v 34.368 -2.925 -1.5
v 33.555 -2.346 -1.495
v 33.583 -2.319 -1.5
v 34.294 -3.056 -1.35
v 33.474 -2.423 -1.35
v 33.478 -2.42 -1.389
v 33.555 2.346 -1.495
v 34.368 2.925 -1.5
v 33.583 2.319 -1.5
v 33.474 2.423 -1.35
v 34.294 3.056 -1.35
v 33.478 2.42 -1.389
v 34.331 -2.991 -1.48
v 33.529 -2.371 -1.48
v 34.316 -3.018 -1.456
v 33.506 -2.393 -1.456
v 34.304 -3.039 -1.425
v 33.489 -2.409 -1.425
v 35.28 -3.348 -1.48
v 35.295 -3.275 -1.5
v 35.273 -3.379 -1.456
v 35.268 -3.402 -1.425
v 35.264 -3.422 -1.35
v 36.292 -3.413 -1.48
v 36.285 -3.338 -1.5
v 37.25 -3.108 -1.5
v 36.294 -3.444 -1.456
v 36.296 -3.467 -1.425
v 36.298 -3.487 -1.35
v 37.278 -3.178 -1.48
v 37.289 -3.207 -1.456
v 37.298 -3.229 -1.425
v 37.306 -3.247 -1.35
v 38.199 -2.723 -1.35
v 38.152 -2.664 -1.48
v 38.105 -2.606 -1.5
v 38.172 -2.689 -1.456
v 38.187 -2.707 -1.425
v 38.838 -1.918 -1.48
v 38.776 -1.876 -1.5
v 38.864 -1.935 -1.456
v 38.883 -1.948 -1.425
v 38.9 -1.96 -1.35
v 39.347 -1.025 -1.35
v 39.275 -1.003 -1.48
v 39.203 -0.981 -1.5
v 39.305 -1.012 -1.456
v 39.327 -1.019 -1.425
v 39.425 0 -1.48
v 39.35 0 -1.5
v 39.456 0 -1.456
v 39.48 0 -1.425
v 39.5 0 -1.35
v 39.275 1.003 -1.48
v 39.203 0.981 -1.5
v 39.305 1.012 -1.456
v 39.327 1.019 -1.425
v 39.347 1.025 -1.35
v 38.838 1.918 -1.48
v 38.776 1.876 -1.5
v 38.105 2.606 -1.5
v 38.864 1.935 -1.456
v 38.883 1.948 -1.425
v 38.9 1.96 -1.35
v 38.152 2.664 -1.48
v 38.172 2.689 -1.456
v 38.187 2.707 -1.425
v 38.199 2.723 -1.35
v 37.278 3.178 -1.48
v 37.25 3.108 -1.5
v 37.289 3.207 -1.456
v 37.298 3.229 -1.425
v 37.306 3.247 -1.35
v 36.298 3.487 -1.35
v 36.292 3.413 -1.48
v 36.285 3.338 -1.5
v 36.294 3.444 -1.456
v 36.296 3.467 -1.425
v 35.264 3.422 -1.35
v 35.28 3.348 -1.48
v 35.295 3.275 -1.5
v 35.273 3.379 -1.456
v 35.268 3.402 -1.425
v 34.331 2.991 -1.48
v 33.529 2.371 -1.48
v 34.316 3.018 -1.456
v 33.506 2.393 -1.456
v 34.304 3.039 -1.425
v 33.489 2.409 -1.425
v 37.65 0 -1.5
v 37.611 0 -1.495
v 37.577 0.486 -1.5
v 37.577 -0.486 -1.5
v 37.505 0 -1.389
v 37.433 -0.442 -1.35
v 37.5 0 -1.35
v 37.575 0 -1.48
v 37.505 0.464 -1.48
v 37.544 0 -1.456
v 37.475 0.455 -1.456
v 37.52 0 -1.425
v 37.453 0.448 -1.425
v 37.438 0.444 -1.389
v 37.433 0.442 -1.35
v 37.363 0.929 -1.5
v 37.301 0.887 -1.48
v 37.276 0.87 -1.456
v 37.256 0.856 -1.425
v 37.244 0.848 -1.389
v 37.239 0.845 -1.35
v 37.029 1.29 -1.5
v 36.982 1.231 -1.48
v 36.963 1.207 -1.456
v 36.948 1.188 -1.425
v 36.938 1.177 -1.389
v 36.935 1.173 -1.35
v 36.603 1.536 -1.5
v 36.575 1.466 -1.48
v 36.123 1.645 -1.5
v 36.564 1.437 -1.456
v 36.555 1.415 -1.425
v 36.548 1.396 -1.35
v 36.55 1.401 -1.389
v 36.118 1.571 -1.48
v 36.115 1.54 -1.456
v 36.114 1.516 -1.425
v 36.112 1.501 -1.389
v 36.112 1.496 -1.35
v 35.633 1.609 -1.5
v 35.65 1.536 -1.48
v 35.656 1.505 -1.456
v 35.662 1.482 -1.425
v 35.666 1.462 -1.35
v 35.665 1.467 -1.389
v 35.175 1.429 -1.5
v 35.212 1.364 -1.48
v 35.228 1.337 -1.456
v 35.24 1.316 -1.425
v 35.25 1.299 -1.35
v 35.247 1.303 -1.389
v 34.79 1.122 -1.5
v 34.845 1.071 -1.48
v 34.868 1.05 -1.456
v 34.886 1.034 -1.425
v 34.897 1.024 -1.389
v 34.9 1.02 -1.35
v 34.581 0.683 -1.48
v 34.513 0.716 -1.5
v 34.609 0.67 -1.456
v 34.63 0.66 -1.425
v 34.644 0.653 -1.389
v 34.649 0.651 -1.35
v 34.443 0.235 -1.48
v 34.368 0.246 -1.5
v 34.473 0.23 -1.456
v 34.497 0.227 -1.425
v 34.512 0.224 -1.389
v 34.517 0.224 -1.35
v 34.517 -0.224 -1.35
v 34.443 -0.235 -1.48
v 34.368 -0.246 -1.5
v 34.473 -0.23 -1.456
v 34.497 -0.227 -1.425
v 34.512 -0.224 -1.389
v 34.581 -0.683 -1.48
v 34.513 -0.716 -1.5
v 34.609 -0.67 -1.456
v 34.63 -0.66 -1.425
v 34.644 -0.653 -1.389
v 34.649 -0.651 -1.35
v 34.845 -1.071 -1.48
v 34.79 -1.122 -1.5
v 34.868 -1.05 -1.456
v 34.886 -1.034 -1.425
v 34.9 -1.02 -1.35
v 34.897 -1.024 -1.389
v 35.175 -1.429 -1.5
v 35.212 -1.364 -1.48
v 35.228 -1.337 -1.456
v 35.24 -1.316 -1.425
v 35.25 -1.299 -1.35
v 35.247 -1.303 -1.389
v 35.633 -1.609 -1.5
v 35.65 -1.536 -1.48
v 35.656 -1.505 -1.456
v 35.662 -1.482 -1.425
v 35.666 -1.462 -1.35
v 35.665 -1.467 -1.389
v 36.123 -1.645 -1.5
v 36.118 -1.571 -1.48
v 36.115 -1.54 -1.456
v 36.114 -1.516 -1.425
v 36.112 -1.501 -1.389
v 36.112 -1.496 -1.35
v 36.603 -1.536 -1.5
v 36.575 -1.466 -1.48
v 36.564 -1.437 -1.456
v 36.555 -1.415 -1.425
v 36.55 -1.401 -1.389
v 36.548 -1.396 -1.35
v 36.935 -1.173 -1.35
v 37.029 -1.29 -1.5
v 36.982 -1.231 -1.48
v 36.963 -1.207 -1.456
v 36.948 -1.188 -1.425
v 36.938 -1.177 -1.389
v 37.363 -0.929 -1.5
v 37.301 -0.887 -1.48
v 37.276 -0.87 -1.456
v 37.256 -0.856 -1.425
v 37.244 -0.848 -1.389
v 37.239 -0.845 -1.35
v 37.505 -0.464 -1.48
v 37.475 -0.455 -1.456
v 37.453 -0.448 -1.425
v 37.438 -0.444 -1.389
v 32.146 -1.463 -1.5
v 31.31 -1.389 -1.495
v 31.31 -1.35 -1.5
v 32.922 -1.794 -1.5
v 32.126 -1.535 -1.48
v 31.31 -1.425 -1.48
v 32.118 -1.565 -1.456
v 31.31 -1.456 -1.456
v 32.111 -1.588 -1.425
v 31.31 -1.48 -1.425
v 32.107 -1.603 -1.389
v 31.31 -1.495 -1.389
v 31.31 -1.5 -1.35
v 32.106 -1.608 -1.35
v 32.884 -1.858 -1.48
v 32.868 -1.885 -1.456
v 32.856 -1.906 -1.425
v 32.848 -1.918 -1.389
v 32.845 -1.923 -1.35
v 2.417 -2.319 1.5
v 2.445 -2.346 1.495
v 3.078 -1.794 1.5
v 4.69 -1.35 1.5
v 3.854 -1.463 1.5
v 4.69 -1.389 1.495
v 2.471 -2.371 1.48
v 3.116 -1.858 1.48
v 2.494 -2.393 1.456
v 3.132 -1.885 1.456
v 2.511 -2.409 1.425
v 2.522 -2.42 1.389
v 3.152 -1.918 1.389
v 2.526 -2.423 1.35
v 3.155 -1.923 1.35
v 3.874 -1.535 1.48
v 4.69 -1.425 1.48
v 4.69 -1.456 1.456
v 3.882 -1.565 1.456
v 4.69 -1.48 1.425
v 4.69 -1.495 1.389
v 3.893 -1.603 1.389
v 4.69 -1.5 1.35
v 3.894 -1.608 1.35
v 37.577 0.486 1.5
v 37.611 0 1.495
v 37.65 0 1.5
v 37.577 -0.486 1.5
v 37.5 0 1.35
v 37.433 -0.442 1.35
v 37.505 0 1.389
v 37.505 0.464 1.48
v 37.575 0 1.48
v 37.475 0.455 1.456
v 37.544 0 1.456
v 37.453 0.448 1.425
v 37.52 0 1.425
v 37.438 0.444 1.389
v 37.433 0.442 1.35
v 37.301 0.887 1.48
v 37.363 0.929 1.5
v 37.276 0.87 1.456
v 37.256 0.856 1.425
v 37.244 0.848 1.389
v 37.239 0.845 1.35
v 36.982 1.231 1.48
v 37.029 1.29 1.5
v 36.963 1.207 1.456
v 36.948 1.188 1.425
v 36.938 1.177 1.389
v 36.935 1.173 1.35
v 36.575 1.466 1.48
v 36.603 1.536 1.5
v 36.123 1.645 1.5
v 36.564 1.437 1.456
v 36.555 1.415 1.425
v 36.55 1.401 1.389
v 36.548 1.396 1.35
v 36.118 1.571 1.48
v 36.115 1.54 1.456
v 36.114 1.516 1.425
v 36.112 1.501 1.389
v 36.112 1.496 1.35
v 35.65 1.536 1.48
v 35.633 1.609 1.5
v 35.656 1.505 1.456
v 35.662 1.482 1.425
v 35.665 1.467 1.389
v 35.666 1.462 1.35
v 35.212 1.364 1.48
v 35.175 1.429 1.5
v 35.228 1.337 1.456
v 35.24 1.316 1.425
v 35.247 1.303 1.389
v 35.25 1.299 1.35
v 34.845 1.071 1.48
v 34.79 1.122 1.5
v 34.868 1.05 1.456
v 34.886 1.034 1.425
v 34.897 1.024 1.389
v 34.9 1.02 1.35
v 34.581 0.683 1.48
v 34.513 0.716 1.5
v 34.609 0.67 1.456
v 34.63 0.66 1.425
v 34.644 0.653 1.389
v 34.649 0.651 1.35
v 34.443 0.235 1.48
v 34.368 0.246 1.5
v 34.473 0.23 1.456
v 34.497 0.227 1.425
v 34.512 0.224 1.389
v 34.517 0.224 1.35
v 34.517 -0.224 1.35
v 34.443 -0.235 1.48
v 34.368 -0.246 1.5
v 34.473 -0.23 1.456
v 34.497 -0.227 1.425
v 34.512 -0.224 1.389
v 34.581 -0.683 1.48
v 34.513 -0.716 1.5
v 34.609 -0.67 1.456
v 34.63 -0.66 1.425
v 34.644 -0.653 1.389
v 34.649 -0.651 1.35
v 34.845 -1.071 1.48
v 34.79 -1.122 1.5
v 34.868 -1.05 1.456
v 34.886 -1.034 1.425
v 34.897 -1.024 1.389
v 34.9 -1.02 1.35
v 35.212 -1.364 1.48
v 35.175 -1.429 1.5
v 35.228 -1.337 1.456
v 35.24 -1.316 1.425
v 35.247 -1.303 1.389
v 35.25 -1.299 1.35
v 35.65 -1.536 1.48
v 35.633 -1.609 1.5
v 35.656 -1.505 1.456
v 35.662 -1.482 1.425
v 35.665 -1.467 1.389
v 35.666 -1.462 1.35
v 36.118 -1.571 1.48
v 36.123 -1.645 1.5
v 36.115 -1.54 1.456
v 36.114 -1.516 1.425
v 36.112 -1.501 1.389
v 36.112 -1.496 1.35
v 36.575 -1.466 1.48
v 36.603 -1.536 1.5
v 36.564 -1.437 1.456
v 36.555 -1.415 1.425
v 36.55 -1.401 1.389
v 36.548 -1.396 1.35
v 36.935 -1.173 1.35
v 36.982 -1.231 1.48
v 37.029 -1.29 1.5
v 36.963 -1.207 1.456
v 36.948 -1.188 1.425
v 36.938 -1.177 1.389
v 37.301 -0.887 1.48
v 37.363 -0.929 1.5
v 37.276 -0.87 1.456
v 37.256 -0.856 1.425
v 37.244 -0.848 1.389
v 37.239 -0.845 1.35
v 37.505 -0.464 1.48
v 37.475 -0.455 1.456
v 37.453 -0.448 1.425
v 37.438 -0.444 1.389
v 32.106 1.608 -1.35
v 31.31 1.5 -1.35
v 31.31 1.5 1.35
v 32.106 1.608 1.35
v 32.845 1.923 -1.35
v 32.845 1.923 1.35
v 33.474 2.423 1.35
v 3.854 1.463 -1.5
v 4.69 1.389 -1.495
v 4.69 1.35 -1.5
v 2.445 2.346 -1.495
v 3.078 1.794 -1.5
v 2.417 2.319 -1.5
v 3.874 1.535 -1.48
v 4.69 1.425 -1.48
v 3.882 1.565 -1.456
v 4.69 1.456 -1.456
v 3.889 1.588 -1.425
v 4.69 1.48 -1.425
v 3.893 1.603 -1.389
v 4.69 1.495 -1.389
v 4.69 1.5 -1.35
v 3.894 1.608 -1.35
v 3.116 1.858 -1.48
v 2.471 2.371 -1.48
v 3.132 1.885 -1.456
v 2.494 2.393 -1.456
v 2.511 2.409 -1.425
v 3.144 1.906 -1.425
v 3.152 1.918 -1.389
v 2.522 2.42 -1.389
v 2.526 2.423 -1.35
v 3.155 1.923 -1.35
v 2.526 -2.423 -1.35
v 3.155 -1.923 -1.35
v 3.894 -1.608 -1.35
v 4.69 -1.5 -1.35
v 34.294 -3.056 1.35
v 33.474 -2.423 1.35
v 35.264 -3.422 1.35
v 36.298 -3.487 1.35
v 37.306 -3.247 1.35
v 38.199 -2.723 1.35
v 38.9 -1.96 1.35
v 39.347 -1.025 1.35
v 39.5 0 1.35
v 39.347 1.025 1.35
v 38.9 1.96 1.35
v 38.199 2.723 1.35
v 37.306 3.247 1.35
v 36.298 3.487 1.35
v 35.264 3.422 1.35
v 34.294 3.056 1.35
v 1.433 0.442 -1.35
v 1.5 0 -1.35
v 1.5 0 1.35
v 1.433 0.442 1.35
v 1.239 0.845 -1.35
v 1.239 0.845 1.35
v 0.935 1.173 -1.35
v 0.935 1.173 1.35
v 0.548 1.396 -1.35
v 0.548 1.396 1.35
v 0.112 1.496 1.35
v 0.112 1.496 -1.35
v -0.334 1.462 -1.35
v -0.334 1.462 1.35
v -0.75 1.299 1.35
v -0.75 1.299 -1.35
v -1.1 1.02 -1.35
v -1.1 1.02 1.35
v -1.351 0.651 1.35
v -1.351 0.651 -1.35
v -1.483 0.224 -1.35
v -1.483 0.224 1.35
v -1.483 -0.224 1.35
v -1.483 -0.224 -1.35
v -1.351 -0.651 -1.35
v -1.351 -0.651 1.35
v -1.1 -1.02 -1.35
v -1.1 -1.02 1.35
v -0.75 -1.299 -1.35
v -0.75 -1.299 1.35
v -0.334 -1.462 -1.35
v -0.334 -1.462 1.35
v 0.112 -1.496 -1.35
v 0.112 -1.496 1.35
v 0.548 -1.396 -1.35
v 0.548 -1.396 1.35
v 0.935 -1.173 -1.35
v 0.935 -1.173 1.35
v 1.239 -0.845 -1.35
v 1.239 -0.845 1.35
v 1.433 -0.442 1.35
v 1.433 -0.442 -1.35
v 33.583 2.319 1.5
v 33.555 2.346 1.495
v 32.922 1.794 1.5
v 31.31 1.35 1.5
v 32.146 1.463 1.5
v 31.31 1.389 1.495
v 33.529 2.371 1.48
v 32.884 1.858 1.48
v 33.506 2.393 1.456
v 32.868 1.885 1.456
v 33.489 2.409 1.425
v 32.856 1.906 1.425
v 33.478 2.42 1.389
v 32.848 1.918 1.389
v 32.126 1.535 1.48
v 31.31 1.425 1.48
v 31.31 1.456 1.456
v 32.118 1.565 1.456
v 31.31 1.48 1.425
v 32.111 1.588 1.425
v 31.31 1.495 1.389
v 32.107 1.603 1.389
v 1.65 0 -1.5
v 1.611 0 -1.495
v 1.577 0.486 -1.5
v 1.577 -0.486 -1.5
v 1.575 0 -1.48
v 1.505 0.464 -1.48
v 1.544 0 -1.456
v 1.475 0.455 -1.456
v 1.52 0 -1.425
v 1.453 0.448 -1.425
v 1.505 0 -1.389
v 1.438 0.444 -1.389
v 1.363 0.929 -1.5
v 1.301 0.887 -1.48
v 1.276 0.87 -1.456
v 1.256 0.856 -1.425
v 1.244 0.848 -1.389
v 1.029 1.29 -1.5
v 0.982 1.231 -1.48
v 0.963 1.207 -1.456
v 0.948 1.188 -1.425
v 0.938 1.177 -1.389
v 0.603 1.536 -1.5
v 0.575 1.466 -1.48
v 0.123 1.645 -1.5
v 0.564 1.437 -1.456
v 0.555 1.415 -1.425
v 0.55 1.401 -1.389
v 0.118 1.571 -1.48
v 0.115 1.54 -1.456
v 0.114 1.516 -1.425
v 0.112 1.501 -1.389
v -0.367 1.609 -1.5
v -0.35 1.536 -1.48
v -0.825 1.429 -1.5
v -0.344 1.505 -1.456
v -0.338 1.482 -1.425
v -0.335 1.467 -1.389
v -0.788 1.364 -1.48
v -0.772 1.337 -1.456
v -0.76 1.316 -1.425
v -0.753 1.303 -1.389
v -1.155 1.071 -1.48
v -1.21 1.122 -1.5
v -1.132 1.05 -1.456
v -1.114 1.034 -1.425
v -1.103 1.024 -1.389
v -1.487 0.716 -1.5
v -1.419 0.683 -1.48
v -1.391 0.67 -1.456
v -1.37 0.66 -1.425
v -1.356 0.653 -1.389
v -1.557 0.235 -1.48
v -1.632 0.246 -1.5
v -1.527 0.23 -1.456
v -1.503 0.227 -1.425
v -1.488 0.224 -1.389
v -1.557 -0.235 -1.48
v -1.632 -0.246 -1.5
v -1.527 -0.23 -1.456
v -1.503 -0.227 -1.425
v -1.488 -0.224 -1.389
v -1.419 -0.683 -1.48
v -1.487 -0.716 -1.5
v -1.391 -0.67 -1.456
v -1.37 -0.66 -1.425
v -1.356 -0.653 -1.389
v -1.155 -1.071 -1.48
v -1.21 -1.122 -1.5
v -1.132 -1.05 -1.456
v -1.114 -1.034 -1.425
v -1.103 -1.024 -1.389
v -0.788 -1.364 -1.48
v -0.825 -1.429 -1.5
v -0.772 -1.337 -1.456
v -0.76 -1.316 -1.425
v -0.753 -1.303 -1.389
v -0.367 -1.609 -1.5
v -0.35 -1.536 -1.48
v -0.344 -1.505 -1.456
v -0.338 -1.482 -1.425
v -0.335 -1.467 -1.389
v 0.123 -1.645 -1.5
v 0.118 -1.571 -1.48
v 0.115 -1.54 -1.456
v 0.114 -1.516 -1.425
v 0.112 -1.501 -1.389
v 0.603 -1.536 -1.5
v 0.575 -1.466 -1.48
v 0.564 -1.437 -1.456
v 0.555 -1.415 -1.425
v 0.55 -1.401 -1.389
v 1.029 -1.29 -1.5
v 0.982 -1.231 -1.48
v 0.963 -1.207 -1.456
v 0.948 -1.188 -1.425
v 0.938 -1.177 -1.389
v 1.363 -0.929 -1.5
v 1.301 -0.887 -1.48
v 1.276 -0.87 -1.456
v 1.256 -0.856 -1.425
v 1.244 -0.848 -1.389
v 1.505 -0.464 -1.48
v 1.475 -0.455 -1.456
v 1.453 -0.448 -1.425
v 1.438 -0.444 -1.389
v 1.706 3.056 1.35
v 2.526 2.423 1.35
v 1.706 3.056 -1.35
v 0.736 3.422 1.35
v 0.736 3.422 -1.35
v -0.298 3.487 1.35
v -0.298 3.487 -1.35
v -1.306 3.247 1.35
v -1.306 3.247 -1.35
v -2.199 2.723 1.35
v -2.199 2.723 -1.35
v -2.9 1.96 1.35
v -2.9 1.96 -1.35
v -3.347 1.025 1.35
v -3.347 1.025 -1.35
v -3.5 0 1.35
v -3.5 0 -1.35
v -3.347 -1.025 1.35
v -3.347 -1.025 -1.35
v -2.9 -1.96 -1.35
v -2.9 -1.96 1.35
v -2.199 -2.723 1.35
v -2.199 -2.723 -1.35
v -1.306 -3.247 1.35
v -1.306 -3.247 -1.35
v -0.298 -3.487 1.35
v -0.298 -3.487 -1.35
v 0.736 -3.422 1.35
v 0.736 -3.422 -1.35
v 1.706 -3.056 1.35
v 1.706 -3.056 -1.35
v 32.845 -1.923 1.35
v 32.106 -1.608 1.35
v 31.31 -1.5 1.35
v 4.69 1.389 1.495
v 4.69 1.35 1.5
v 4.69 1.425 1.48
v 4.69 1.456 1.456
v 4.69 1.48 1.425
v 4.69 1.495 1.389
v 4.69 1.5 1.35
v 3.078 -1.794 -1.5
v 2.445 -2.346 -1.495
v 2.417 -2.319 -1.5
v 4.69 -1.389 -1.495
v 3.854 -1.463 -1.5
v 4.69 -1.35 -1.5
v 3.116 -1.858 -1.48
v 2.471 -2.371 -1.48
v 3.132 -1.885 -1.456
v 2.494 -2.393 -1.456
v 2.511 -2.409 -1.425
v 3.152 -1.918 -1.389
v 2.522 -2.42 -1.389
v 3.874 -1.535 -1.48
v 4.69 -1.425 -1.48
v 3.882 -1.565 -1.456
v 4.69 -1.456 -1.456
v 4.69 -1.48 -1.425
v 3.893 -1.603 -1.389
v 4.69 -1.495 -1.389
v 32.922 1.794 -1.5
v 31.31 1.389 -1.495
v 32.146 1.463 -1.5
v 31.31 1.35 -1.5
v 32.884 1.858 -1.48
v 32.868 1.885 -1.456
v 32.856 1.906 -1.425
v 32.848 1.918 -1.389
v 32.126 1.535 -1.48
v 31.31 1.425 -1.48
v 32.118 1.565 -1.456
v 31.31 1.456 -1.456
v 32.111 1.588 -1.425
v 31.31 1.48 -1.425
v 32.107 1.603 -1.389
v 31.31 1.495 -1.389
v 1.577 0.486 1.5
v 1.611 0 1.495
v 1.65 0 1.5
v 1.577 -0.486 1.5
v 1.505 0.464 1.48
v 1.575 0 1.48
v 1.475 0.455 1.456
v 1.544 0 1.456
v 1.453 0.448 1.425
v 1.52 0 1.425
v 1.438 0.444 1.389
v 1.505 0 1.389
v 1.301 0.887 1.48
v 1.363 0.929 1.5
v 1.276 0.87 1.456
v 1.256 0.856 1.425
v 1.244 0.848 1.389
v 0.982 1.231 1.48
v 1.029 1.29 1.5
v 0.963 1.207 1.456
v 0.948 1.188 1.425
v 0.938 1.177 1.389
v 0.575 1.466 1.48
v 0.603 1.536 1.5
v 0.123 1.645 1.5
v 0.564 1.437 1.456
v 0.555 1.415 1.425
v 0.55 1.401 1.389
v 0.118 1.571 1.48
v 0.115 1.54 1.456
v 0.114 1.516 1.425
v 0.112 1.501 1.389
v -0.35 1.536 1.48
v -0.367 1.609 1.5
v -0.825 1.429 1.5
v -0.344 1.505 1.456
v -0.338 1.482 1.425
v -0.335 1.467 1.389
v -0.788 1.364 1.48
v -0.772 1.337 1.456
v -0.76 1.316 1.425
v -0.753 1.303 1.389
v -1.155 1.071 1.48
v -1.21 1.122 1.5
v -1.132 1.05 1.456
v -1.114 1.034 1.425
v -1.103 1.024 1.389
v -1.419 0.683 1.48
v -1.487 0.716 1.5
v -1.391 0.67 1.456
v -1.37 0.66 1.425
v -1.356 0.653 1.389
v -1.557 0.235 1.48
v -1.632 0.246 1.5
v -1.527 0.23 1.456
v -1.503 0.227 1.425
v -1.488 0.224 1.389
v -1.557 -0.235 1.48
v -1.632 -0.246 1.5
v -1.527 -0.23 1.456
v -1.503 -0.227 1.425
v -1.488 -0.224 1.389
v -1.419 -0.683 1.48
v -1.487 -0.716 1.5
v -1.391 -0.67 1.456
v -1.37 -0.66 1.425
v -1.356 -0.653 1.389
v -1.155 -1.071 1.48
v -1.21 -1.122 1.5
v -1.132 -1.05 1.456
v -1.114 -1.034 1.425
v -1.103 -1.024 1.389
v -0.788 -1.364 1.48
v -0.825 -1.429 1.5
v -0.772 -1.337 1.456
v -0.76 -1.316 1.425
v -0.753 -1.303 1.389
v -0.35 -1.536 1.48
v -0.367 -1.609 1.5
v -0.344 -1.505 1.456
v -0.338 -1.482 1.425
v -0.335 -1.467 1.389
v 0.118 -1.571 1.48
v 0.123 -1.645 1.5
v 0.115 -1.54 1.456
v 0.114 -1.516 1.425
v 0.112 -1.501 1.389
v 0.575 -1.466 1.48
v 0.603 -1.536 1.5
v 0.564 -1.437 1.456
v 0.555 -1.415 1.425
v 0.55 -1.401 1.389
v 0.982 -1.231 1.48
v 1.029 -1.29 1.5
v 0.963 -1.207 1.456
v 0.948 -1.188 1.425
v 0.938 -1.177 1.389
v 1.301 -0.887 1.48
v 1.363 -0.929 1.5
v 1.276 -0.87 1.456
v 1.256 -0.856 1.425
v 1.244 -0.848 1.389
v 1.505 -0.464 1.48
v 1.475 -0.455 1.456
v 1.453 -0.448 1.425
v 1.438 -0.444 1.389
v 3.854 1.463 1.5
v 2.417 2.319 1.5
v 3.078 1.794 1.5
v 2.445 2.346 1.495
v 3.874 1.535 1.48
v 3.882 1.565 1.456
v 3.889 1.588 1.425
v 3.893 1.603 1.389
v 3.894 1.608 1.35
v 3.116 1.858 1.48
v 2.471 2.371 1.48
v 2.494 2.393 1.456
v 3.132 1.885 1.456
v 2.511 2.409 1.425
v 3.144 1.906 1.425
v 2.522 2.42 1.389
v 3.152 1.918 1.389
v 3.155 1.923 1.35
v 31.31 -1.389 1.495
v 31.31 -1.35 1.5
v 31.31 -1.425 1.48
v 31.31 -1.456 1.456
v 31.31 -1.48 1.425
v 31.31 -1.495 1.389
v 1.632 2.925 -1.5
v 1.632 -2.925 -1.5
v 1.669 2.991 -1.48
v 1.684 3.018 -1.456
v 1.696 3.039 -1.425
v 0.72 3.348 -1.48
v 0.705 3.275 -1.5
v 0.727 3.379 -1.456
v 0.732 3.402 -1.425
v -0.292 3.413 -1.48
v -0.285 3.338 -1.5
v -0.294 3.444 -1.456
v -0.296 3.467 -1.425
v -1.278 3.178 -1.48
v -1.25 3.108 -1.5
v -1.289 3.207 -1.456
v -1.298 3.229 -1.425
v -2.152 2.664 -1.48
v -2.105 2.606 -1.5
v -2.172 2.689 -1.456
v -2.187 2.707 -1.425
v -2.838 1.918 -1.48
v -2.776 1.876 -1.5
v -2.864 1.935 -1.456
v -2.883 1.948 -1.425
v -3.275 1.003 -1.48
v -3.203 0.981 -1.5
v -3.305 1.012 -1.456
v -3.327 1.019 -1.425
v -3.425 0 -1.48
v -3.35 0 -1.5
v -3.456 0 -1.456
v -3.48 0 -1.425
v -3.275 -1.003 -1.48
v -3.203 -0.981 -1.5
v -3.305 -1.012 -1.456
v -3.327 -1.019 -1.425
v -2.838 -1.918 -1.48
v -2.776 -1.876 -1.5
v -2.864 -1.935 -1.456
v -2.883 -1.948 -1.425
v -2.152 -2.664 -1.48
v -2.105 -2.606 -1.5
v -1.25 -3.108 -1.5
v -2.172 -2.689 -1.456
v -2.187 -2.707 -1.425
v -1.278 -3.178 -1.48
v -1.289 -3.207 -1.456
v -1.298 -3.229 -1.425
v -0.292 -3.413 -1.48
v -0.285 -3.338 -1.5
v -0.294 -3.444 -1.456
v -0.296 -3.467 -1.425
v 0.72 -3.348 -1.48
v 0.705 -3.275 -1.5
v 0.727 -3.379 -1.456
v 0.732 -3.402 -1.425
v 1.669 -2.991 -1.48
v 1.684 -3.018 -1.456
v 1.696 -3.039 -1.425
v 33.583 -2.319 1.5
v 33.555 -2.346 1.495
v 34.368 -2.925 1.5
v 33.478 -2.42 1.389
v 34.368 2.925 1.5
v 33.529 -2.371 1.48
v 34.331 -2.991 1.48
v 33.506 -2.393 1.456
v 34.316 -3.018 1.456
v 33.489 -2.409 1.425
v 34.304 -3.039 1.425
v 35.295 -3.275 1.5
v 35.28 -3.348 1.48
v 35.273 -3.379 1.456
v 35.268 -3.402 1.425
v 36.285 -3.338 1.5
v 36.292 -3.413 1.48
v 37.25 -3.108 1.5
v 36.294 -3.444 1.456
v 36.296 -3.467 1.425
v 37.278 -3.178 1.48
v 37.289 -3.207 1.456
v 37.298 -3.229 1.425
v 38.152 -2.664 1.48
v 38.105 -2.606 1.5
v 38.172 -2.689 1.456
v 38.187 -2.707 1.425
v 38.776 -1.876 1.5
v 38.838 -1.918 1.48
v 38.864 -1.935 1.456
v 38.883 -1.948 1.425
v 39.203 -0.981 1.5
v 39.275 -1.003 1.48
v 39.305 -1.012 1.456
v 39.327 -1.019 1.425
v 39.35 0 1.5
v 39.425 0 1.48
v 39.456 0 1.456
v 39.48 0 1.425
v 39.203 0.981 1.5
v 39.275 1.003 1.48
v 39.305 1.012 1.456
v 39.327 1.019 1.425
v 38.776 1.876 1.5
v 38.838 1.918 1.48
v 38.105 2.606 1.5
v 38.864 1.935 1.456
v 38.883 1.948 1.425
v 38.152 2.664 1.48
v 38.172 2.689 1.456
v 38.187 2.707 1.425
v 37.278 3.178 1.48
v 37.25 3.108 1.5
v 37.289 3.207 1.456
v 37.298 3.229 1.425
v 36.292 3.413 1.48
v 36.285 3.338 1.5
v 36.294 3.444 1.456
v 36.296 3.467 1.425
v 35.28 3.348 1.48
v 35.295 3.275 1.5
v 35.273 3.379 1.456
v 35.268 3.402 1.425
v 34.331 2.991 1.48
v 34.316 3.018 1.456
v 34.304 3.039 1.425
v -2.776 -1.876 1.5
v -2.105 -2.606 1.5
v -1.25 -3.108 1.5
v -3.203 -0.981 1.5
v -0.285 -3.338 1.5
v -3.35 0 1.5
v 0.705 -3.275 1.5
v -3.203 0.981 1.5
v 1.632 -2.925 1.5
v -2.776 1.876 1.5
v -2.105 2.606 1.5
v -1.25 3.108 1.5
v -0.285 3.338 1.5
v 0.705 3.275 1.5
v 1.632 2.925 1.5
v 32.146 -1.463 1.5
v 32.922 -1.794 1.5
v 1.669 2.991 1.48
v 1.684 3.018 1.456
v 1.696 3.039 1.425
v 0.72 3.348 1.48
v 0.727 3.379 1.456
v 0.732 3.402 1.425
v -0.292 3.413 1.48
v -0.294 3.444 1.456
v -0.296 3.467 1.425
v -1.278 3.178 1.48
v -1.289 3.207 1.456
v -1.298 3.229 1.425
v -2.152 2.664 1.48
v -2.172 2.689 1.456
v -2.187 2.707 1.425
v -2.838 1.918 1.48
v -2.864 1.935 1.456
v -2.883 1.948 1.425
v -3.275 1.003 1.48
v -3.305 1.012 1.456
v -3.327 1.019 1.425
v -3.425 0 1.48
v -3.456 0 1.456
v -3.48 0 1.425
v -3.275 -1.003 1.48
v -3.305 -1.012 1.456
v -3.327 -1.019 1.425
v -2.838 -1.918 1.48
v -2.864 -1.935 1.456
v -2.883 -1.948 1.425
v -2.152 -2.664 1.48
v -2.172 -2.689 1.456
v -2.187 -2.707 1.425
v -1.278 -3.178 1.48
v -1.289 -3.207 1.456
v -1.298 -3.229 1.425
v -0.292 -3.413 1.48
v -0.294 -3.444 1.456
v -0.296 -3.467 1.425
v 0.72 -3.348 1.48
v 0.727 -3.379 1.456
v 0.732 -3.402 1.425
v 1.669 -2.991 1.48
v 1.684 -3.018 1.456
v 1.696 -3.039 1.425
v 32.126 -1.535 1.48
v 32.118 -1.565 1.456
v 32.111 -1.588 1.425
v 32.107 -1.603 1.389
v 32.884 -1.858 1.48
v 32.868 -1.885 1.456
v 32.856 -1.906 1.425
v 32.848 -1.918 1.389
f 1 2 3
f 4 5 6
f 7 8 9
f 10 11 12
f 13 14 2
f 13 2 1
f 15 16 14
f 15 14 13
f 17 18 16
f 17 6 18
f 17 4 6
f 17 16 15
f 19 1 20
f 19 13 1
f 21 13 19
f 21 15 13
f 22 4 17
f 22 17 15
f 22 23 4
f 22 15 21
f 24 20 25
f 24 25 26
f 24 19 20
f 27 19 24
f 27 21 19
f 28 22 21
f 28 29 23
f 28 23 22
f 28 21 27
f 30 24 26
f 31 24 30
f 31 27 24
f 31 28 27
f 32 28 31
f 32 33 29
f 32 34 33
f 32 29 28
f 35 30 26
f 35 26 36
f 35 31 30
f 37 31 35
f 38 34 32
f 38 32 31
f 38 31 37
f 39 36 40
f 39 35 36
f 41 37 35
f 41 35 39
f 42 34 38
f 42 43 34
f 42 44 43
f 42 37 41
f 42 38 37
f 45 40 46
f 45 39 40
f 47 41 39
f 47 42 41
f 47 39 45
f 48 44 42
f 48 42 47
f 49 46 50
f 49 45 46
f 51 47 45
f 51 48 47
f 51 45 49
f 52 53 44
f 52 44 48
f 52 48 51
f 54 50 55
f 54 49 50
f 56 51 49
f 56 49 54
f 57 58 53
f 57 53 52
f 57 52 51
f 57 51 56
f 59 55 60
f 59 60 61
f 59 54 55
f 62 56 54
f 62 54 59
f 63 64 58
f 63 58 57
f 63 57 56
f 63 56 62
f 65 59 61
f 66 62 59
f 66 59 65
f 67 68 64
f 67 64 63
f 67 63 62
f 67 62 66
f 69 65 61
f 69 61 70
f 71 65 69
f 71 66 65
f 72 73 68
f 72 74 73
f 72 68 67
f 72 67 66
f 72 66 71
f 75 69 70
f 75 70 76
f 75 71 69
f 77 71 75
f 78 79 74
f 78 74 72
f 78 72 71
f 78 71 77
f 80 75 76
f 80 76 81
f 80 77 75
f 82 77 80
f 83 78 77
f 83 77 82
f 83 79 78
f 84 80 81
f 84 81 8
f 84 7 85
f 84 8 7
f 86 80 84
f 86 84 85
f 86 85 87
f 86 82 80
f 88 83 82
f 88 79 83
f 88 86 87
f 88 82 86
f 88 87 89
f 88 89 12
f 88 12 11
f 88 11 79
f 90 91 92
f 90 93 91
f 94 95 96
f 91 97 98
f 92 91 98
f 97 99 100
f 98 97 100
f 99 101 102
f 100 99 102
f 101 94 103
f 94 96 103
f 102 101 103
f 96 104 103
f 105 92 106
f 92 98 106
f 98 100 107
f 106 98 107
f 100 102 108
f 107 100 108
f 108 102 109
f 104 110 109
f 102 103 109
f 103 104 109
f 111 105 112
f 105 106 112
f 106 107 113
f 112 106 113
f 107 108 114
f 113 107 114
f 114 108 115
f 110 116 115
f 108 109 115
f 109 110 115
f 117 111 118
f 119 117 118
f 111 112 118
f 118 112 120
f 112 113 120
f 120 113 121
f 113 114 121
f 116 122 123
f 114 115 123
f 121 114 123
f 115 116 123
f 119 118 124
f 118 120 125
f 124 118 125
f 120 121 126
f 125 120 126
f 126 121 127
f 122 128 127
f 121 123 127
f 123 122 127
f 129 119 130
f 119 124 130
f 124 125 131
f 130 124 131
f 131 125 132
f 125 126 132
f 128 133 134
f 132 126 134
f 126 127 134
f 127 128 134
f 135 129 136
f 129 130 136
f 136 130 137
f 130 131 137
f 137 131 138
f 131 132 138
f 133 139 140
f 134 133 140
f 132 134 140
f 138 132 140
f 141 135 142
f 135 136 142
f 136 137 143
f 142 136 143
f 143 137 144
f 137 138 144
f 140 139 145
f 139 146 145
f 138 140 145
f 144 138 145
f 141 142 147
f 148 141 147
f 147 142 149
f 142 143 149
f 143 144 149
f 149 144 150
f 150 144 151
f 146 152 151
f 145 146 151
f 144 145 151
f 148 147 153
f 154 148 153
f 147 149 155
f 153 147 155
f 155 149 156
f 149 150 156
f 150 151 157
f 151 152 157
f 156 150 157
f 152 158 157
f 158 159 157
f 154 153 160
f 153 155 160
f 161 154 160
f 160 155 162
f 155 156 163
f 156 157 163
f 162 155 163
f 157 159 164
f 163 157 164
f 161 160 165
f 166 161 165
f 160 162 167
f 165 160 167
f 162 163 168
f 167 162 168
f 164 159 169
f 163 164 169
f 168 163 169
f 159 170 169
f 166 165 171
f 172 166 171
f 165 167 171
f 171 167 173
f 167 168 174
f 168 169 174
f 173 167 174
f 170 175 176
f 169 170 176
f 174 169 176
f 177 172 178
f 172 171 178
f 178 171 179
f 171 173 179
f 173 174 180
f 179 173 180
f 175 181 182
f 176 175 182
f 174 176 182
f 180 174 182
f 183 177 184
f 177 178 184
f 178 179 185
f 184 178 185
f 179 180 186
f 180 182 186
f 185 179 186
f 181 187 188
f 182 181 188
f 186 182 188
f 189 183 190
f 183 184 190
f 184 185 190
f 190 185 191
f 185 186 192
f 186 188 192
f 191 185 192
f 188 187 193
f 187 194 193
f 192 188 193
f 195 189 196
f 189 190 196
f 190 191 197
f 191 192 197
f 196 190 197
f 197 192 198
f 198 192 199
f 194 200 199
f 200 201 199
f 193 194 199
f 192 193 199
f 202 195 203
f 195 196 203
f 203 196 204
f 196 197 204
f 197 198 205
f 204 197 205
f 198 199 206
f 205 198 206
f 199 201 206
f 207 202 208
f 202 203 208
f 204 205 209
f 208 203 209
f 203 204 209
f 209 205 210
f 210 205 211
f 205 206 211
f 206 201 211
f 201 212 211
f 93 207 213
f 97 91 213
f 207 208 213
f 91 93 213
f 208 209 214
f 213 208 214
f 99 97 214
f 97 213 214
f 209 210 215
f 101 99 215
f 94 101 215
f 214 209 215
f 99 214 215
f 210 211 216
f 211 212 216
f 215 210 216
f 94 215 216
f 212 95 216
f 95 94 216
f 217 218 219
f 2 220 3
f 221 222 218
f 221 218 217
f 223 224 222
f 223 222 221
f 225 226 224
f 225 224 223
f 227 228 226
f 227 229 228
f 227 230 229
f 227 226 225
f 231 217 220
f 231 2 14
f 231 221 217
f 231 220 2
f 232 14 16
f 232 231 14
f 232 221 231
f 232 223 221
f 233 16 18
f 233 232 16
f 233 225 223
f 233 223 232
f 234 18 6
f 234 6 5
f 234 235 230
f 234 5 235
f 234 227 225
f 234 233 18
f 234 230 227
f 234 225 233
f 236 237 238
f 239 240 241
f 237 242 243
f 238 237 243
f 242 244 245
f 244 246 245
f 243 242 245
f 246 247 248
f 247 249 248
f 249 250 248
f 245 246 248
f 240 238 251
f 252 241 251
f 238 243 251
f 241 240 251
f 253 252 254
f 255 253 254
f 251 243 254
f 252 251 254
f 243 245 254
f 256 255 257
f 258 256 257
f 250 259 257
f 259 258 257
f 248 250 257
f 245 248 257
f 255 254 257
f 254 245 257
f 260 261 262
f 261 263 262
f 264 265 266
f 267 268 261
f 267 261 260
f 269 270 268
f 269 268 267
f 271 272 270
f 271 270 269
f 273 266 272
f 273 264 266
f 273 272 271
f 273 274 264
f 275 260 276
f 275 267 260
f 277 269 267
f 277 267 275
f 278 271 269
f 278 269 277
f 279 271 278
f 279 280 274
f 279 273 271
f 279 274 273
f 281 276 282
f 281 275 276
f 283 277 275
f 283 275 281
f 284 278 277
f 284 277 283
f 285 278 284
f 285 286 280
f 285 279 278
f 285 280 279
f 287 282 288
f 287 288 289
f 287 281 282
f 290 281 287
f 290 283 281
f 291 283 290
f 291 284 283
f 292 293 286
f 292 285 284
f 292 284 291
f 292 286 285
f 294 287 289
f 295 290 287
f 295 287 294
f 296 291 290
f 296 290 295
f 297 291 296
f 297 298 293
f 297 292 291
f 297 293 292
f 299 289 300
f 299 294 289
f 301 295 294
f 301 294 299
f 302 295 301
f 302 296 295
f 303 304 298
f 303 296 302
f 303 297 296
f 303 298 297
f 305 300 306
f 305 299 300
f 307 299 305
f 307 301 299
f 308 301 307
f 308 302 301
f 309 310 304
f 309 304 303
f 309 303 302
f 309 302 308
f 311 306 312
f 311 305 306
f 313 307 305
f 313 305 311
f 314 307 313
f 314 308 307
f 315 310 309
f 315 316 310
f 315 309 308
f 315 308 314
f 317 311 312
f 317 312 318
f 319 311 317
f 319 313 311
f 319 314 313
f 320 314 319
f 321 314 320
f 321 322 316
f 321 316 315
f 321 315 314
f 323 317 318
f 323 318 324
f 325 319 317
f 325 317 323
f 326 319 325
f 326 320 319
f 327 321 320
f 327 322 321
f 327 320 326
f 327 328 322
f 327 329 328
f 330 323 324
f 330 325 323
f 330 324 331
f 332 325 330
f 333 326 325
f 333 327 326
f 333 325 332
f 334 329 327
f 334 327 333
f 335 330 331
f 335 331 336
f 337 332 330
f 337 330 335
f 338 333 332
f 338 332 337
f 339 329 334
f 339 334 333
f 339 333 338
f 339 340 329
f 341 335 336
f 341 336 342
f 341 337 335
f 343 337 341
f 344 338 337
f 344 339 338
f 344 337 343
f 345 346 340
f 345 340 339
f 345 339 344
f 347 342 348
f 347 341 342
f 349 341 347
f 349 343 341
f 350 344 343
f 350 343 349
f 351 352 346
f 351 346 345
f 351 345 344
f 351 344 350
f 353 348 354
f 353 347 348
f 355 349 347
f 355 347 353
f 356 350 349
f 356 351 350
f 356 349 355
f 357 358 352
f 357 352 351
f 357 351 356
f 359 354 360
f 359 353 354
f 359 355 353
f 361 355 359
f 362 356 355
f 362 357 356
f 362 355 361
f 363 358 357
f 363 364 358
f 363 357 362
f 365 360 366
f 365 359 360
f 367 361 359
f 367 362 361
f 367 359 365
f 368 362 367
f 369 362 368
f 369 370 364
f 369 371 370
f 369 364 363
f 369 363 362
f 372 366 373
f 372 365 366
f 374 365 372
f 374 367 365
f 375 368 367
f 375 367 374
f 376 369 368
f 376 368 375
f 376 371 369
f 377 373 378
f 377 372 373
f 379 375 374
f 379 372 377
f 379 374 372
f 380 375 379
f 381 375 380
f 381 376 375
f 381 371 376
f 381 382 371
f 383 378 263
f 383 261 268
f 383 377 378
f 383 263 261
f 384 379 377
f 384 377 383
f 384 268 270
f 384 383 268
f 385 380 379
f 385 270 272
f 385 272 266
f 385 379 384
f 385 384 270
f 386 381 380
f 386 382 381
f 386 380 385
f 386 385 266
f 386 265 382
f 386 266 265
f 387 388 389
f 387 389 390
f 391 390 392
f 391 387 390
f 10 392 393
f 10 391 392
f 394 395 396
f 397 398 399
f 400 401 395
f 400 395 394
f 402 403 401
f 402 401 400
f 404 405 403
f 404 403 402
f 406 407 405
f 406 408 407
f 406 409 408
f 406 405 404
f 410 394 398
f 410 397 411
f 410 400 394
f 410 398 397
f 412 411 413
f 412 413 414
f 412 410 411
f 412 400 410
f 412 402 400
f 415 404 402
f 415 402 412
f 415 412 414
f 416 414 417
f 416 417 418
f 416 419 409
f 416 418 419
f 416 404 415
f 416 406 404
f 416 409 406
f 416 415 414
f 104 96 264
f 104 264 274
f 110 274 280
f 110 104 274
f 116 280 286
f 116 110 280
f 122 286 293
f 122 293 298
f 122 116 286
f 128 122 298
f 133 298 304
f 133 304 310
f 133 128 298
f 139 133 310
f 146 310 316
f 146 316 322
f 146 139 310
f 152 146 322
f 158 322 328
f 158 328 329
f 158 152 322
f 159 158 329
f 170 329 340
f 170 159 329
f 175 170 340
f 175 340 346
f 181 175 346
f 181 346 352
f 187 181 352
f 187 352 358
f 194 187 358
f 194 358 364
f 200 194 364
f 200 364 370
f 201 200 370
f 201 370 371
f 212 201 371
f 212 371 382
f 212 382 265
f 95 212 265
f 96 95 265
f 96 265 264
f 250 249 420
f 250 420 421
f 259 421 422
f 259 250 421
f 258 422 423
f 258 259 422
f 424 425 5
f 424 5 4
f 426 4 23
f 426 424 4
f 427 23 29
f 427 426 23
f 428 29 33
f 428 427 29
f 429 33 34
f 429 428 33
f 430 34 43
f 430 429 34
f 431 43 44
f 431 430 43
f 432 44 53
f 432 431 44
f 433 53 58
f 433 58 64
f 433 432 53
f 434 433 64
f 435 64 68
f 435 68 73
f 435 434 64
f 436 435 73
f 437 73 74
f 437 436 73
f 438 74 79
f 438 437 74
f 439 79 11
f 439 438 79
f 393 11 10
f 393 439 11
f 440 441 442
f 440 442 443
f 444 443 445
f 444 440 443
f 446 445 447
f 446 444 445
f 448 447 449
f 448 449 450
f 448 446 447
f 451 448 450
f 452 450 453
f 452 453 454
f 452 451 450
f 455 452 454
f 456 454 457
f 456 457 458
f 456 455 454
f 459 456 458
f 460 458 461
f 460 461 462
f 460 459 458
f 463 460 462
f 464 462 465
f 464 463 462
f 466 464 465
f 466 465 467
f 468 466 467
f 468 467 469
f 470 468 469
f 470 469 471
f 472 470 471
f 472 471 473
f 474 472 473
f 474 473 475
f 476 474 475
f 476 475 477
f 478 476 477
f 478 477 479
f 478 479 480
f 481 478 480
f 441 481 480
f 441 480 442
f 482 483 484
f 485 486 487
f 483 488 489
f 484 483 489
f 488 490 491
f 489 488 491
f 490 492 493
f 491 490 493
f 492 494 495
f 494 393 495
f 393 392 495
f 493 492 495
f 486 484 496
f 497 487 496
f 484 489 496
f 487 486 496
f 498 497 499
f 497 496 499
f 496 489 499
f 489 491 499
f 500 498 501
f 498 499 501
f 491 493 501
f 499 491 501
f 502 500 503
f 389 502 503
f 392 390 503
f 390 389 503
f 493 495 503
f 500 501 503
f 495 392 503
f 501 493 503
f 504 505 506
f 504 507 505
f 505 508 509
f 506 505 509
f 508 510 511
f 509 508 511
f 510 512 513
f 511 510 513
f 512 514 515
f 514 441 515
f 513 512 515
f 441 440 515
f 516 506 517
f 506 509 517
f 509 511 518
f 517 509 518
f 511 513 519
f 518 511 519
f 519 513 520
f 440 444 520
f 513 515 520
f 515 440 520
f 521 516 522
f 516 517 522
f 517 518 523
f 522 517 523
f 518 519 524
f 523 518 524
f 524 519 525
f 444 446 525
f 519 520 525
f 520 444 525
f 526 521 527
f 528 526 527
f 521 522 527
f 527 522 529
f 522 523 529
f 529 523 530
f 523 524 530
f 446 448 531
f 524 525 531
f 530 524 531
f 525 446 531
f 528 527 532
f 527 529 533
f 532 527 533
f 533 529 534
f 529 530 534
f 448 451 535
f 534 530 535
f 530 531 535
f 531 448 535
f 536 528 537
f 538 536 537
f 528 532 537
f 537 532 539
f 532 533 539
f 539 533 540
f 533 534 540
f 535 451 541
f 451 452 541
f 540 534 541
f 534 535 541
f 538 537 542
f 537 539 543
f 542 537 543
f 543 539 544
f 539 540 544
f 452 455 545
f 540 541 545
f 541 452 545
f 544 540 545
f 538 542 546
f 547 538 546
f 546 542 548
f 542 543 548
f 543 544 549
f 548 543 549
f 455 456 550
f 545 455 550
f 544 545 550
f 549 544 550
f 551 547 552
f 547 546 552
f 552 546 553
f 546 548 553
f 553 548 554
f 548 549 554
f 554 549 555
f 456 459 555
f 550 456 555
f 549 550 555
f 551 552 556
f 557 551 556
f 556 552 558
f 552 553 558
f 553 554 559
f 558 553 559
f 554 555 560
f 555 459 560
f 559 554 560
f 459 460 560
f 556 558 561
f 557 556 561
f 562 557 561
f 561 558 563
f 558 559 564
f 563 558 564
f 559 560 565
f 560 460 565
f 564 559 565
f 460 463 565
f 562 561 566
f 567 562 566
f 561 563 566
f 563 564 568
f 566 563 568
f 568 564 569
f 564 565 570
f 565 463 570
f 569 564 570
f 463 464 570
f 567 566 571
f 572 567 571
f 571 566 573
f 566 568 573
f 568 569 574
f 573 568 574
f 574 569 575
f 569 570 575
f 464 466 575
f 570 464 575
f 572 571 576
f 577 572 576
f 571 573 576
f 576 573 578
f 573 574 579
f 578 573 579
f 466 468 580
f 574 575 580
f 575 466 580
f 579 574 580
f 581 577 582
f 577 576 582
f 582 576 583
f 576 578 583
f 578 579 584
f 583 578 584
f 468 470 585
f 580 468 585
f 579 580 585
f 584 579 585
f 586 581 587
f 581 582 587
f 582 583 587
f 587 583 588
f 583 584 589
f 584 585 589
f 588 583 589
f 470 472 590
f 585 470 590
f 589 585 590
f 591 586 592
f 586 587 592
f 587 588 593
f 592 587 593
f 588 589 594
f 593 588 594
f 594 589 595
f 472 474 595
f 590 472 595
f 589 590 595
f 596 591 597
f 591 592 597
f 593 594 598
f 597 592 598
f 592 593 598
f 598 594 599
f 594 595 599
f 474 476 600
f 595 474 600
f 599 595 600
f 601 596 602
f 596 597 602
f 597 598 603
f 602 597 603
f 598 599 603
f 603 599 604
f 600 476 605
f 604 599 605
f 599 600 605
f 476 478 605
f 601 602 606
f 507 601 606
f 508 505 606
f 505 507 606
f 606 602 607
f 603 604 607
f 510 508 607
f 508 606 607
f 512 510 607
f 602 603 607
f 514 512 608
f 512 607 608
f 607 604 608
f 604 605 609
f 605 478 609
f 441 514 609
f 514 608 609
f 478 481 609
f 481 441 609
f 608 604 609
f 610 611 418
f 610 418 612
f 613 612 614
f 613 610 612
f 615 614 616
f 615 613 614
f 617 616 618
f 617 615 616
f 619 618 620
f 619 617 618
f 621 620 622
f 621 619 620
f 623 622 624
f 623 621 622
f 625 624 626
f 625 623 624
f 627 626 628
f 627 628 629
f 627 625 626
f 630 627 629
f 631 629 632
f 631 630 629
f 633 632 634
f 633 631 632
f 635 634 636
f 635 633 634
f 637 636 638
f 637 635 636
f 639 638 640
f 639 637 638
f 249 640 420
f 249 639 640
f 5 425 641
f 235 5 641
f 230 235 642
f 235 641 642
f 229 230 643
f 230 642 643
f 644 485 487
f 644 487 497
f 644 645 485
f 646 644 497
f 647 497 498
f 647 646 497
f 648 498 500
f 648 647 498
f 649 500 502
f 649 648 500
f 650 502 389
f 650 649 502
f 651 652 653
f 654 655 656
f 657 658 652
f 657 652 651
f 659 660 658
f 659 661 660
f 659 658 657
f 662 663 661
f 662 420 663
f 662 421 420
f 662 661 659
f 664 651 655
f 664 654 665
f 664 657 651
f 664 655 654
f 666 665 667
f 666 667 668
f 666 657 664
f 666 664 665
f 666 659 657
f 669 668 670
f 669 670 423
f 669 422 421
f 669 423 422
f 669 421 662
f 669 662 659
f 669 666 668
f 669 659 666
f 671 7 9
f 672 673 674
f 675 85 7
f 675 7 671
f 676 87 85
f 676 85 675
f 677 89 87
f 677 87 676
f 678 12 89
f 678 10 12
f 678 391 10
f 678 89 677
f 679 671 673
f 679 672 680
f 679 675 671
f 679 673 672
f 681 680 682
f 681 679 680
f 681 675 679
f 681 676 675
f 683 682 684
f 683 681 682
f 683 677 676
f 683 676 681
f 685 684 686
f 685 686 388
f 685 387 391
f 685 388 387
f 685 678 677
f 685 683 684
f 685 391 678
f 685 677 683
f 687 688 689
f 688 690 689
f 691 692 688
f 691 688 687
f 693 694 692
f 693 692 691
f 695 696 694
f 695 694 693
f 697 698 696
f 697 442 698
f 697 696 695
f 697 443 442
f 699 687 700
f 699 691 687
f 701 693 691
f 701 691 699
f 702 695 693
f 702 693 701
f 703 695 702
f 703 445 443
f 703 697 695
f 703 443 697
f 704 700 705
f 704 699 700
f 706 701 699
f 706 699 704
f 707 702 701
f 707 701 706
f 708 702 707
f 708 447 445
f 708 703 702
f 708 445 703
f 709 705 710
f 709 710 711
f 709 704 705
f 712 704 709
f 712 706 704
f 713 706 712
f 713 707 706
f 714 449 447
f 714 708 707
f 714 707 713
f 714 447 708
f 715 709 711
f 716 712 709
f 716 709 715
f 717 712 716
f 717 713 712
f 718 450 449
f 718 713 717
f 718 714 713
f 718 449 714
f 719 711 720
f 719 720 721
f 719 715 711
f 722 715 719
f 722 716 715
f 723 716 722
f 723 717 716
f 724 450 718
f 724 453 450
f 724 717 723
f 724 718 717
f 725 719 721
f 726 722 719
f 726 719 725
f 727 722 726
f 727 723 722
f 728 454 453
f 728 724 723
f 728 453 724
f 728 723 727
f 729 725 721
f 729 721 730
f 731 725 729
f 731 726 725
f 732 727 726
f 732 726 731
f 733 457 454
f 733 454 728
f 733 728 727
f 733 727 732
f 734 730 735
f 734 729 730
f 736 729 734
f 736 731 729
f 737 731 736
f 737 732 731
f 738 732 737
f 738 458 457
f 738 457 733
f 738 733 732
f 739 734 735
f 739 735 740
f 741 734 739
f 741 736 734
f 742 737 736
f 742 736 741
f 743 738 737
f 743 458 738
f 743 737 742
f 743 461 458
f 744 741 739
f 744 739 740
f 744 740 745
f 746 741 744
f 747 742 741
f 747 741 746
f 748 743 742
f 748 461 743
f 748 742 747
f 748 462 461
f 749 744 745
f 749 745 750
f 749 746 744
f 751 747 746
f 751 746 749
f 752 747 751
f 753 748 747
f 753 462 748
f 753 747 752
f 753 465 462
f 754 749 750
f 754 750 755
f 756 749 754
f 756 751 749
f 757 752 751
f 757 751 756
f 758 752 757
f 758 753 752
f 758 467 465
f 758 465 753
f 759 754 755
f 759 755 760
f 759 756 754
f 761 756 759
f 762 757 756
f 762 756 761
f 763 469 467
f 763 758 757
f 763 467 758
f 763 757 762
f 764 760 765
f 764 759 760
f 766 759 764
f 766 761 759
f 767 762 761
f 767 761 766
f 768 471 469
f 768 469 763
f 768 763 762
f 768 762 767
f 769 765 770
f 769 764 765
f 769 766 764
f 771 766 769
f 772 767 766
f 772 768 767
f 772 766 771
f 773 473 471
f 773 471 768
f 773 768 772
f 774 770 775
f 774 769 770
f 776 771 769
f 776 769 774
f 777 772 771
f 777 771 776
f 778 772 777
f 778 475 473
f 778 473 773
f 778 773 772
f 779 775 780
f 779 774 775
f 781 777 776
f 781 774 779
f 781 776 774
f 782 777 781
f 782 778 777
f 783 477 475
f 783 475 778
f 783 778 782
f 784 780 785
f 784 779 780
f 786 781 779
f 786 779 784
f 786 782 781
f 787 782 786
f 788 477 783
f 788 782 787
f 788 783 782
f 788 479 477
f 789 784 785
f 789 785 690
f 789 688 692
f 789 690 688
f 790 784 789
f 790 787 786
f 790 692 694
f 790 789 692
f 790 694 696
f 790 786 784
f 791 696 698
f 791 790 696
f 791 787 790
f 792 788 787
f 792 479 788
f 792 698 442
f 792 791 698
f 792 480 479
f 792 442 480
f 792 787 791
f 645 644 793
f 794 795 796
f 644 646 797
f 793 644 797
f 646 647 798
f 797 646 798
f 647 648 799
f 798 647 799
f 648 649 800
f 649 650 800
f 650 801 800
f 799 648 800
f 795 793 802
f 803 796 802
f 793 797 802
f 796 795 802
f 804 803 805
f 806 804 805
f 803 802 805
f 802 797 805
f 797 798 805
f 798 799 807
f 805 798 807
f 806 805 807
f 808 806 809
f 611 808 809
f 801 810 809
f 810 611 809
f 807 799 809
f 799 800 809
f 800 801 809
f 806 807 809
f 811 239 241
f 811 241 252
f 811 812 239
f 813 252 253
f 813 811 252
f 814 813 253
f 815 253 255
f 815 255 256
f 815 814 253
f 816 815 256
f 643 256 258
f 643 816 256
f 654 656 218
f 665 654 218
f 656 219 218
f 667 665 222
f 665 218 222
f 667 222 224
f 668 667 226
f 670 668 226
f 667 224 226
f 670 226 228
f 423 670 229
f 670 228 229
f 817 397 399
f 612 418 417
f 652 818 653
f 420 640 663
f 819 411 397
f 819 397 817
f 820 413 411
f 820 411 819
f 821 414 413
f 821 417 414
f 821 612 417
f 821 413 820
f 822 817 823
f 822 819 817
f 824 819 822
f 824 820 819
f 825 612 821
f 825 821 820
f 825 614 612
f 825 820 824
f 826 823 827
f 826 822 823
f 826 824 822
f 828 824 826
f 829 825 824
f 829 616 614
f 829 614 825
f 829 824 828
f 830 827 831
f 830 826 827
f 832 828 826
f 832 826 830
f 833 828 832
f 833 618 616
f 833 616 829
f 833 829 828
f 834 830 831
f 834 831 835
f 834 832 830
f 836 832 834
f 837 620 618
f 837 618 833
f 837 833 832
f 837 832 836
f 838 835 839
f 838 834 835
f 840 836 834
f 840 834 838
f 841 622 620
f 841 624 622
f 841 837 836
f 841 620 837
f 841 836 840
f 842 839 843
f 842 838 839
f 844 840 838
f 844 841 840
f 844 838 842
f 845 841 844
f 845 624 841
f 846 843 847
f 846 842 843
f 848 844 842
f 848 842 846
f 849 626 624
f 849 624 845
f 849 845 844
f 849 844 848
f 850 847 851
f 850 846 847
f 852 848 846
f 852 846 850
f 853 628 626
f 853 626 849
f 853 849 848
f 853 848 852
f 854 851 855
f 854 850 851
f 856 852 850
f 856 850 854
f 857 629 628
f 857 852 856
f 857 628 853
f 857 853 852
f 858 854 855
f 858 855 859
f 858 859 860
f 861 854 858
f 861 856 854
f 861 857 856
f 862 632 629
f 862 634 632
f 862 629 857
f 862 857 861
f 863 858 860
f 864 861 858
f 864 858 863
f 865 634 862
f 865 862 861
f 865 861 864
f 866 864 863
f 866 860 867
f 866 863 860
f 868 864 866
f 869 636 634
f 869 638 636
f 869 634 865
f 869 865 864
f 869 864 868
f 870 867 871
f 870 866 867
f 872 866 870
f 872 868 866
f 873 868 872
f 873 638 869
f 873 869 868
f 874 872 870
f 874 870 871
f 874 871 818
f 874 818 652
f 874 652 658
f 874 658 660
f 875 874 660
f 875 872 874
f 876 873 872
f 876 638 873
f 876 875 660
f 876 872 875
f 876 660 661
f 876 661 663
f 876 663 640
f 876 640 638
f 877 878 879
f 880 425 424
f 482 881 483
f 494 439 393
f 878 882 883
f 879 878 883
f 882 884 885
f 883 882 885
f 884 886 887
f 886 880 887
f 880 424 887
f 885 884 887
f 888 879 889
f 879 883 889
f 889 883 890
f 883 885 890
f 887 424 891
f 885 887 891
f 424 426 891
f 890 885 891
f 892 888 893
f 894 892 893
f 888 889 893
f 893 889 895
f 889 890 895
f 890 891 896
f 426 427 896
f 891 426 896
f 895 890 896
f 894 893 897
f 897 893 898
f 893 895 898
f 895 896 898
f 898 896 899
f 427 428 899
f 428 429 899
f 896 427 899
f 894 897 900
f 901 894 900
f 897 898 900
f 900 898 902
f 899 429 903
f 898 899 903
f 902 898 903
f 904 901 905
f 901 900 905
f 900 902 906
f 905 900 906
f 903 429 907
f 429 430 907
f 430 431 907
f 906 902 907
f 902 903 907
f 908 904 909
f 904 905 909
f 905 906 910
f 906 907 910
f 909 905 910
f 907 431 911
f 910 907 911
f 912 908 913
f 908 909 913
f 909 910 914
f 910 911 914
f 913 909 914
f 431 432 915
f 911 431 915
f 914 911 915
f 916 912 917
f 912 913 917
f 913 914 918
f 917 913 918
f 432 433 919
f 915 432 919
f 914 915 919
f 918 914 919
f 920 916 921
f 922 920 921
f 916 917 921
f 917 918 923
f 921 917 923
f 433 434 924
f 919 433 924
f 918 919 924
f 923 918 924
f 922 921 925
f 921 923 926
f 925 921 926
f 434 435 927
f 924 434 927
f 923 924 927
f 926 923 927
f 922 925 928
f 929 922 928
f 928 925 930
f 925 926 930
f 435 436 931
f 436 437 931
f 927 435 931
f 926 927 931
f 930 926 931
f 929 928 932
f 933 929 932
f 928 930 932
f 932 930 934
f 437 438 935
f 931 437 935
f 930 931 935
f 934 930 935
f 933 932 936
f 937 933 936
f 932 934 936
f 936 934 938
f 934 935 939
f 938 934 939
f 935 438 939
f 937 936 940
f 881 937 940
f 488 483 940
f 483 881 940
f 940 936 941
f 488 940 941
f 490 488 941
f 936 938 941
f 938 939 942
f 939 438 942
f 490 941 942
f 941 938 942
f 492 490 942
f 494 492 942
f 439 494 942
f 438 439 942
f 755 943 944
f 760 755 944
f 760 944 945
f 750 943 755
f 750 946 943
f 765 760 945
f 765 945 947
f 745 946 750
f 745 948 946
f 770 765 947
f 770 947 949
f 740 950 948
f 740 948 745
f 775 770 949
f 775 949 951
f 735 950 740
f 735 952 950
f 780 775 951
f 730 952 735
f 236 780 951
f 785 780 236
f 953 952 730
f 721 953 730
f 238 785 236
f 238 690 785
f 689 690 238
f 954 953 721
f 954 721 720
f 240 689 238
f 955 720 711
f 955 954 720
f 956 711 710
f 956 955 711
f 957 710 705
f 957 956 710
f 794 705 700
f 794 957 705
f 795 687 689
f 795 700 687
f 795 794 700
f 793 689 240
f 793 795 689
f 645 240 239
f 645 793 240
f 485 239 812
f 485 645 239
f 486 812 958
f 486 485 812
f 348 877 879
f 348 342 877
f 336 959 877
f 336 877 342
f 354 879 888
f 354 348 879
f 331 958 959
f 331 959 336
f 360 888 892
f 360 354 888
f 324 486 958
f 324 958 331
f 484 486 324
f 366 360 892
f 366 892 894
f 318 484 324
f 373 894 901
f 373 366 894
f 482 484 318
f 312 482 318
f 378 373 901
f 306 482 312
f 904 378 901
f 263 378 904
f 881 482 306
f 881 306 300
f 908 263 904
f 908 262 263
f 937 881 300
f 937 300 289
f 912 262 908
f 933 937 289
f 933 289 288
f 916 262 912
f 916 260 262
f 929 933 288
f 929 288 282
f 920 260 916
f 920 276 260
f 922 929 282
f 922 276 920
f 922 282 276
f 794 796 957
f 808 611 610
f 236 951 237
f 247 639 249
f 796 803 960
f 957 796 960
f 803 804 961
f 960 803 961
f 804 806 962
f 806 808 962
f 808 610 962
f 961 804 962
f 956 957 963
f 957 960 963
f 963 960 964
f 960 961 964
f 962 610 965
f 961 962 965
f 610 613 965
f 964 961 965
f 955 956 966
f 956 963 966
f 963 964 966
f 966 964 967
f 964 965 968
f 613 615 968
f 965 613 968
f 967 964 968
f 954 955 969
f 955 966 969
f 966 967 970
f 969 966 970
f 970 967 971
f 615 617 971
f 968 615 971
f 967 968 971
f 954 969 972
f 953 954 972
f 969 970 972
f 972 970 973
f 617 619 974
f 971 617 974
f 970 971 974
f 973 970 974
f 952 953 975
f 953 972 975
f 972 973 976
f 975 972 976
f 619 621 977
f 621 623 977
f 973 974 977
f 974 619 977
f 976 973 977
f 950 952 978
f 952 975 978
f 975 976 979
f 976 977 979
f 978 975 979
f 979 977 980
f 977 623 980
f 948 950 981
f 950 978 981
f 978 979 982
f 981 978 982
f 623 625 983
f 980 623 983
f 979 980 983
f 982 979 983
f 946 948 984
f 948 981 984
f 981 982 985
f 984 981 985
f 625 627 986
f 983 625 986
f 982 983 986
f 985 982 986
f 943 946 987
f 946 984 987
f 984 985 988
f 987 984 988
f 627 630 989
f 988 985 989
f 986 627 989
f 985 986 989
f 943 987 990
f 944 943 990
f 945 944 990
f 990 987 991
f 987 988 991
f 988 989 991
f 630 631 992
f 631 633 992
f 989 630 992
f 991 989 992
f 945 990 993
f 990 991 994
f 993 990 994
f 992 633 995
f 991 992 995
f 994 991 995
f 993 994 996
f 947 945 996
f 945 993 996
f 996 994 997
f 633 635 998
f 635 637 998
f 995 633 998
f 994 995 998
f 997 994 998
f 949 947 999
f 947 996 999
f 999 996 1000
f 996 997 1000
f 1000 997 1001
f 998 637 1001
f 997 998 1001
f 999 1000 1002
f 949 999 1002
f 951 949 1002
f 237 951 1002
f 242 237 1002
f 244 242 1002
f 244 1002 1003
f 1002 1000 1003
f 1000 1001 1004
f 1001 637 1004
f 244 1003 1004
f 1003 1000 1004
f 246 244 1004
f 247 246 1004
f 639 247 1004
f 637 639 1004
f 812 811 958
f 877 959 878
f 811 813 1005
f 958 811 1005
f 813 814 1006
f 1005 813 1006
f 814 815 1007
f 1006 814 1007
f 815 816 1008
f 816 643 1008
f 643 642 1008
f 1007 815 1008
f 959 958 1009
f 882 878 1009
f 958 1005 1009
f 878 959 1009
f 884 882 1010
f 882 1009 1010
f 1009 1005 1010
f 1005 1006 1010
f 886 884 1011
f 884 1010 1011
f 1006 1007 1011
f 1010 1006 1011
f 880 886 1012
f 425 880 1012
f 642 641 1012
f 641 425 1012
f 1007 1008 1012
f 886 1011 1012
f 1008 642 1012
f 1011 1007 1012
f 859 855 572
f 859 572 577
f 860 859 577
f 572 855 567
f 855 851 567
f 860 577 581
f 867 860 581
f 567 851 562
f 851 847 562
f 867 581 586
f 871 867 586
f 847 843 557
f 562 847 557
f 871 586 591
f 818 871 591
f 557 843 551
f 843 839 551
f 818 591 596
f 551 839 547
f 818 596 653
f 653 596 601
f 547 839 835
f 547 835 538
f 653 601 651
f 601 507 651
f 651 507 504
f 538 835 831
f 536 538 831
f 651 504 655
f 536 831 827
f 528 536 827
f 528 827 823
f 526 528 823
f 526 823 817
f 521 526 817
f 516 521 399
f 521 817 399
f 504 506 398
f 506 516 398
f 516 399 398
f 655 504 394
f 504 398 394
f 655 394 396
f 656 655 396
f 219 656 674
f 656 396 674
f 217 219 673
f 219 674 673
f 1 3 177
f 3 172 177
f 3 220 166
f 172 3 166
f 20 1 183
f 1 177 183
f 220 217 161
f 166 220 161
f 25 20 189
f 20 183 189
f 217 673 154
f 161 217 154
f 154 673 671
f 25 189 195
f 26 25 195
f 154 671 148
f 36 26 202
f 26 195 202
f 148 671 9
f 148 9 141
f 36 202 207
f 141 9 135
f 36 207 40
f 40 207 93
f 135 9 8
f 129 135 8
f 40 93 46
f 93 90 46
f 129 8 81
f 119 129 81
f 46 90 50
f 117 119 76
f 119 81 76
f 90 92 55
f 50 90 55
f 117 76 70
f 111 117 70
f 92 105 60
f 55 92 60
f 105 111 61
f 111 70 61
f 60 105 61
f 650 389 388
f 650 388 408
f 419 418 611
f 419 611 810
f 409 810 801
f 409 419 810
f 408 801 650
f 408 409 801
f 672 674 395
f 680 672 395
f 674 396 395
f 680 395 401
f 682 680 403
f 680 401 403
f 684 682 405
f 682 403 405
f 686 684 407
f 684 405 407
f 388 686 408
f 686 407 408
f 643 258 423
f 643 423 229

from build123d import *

# Parameters (mm, degrees)
SKETCH1_R           = 3.5
SKETCH1_R_2         = 1.5
BOSS_EXTRUDE1_DEPTH = 1.5
FILLET1_R           = 3
FILLET2_R           = 0.15


with BuildPart() as part:
    # Sketch1 → Boss-Extrude1 (new body, symmetric)
    with BuildSketch(Plane.XY):
        Circle(SKETCH1_R)
        Circle(SKETCH1_R_2, mode=Mode.SUBTRACT)
        with BuildLine():
            ThreePointArc((3.5, 0), (3.414525722, -0.768774411), (3.16227766, -1.5))
            Line((3.16227766, -1.5), (32.83772234, -1.5))
            ThreePointArc((32.83772234, -1.5), (32.5, 0), (32.83772234, 1.5))
            Line((32.83772234, 1.5), (3.16227766, 1.5))
            ThreePointArc((3.16227766, 1.5), (3.414525722, 0.768774411), (3.5, 0))
        make_face()
        with Locations((36, 0)):
            Circle(SKETCH1_R)
        with Locations((36, 0)):
            Circle(SKETCH1_R_2, mode=Mode.SUBTRACT)
    extrude(amount=BOSS_EXTRUDE1_DEPTH, both=True)

    # Fillet1
    fillet1_edges = [part.edges().sort_by_distance(p)[0] for p in [
        (32.83772234, 1.5, 0),
        (32.83772234, -1.5, 0),
        (3.16227766, -1.5, 0),
        (3.16227766, 1.5, 0),
    ]]
    fillet(fillet1_edges, radius=FILLET1_R)

    # Fillet2
    fillet2_edges = [part.edges().sort_by_distance(p)[0] for p in [
        (18, -1.5, -1.5),
        (-1.5, 0, 1.5),
        (18, -1.5, 1.5),
        (-3.5, 0, -1.5),
        (-3.5, 0, 1.5),
        (34.5, 0, 1.5),
        (39.5, 0, -1.5),
        (39.5, 0, 1.5),
        (18, 1.5, -1.5),
        (18, 1.5, 1.5),
        (3.513718949, -1.740401367, -1.5),
        (3.513718949, -1.740401367, 1.5),
        (32.486281051, -1.740401367, -1.5),
        (32.486281051, -1.740401367, 1.5),
        (32.486281051, 1.740401367, -1.5),
        (32.486281051, 1.740401367, 1.5),
        (3.513718949, 1.740401367, -1.5),
        (3.513718949, 1.740401367, 1.5),
        (34.5, 0, -1.5),
        (-1.5, 0, -1.5),
    ]]
    fillet(fillet2_edges, radius=FILLET2_R)


solid = part.part
